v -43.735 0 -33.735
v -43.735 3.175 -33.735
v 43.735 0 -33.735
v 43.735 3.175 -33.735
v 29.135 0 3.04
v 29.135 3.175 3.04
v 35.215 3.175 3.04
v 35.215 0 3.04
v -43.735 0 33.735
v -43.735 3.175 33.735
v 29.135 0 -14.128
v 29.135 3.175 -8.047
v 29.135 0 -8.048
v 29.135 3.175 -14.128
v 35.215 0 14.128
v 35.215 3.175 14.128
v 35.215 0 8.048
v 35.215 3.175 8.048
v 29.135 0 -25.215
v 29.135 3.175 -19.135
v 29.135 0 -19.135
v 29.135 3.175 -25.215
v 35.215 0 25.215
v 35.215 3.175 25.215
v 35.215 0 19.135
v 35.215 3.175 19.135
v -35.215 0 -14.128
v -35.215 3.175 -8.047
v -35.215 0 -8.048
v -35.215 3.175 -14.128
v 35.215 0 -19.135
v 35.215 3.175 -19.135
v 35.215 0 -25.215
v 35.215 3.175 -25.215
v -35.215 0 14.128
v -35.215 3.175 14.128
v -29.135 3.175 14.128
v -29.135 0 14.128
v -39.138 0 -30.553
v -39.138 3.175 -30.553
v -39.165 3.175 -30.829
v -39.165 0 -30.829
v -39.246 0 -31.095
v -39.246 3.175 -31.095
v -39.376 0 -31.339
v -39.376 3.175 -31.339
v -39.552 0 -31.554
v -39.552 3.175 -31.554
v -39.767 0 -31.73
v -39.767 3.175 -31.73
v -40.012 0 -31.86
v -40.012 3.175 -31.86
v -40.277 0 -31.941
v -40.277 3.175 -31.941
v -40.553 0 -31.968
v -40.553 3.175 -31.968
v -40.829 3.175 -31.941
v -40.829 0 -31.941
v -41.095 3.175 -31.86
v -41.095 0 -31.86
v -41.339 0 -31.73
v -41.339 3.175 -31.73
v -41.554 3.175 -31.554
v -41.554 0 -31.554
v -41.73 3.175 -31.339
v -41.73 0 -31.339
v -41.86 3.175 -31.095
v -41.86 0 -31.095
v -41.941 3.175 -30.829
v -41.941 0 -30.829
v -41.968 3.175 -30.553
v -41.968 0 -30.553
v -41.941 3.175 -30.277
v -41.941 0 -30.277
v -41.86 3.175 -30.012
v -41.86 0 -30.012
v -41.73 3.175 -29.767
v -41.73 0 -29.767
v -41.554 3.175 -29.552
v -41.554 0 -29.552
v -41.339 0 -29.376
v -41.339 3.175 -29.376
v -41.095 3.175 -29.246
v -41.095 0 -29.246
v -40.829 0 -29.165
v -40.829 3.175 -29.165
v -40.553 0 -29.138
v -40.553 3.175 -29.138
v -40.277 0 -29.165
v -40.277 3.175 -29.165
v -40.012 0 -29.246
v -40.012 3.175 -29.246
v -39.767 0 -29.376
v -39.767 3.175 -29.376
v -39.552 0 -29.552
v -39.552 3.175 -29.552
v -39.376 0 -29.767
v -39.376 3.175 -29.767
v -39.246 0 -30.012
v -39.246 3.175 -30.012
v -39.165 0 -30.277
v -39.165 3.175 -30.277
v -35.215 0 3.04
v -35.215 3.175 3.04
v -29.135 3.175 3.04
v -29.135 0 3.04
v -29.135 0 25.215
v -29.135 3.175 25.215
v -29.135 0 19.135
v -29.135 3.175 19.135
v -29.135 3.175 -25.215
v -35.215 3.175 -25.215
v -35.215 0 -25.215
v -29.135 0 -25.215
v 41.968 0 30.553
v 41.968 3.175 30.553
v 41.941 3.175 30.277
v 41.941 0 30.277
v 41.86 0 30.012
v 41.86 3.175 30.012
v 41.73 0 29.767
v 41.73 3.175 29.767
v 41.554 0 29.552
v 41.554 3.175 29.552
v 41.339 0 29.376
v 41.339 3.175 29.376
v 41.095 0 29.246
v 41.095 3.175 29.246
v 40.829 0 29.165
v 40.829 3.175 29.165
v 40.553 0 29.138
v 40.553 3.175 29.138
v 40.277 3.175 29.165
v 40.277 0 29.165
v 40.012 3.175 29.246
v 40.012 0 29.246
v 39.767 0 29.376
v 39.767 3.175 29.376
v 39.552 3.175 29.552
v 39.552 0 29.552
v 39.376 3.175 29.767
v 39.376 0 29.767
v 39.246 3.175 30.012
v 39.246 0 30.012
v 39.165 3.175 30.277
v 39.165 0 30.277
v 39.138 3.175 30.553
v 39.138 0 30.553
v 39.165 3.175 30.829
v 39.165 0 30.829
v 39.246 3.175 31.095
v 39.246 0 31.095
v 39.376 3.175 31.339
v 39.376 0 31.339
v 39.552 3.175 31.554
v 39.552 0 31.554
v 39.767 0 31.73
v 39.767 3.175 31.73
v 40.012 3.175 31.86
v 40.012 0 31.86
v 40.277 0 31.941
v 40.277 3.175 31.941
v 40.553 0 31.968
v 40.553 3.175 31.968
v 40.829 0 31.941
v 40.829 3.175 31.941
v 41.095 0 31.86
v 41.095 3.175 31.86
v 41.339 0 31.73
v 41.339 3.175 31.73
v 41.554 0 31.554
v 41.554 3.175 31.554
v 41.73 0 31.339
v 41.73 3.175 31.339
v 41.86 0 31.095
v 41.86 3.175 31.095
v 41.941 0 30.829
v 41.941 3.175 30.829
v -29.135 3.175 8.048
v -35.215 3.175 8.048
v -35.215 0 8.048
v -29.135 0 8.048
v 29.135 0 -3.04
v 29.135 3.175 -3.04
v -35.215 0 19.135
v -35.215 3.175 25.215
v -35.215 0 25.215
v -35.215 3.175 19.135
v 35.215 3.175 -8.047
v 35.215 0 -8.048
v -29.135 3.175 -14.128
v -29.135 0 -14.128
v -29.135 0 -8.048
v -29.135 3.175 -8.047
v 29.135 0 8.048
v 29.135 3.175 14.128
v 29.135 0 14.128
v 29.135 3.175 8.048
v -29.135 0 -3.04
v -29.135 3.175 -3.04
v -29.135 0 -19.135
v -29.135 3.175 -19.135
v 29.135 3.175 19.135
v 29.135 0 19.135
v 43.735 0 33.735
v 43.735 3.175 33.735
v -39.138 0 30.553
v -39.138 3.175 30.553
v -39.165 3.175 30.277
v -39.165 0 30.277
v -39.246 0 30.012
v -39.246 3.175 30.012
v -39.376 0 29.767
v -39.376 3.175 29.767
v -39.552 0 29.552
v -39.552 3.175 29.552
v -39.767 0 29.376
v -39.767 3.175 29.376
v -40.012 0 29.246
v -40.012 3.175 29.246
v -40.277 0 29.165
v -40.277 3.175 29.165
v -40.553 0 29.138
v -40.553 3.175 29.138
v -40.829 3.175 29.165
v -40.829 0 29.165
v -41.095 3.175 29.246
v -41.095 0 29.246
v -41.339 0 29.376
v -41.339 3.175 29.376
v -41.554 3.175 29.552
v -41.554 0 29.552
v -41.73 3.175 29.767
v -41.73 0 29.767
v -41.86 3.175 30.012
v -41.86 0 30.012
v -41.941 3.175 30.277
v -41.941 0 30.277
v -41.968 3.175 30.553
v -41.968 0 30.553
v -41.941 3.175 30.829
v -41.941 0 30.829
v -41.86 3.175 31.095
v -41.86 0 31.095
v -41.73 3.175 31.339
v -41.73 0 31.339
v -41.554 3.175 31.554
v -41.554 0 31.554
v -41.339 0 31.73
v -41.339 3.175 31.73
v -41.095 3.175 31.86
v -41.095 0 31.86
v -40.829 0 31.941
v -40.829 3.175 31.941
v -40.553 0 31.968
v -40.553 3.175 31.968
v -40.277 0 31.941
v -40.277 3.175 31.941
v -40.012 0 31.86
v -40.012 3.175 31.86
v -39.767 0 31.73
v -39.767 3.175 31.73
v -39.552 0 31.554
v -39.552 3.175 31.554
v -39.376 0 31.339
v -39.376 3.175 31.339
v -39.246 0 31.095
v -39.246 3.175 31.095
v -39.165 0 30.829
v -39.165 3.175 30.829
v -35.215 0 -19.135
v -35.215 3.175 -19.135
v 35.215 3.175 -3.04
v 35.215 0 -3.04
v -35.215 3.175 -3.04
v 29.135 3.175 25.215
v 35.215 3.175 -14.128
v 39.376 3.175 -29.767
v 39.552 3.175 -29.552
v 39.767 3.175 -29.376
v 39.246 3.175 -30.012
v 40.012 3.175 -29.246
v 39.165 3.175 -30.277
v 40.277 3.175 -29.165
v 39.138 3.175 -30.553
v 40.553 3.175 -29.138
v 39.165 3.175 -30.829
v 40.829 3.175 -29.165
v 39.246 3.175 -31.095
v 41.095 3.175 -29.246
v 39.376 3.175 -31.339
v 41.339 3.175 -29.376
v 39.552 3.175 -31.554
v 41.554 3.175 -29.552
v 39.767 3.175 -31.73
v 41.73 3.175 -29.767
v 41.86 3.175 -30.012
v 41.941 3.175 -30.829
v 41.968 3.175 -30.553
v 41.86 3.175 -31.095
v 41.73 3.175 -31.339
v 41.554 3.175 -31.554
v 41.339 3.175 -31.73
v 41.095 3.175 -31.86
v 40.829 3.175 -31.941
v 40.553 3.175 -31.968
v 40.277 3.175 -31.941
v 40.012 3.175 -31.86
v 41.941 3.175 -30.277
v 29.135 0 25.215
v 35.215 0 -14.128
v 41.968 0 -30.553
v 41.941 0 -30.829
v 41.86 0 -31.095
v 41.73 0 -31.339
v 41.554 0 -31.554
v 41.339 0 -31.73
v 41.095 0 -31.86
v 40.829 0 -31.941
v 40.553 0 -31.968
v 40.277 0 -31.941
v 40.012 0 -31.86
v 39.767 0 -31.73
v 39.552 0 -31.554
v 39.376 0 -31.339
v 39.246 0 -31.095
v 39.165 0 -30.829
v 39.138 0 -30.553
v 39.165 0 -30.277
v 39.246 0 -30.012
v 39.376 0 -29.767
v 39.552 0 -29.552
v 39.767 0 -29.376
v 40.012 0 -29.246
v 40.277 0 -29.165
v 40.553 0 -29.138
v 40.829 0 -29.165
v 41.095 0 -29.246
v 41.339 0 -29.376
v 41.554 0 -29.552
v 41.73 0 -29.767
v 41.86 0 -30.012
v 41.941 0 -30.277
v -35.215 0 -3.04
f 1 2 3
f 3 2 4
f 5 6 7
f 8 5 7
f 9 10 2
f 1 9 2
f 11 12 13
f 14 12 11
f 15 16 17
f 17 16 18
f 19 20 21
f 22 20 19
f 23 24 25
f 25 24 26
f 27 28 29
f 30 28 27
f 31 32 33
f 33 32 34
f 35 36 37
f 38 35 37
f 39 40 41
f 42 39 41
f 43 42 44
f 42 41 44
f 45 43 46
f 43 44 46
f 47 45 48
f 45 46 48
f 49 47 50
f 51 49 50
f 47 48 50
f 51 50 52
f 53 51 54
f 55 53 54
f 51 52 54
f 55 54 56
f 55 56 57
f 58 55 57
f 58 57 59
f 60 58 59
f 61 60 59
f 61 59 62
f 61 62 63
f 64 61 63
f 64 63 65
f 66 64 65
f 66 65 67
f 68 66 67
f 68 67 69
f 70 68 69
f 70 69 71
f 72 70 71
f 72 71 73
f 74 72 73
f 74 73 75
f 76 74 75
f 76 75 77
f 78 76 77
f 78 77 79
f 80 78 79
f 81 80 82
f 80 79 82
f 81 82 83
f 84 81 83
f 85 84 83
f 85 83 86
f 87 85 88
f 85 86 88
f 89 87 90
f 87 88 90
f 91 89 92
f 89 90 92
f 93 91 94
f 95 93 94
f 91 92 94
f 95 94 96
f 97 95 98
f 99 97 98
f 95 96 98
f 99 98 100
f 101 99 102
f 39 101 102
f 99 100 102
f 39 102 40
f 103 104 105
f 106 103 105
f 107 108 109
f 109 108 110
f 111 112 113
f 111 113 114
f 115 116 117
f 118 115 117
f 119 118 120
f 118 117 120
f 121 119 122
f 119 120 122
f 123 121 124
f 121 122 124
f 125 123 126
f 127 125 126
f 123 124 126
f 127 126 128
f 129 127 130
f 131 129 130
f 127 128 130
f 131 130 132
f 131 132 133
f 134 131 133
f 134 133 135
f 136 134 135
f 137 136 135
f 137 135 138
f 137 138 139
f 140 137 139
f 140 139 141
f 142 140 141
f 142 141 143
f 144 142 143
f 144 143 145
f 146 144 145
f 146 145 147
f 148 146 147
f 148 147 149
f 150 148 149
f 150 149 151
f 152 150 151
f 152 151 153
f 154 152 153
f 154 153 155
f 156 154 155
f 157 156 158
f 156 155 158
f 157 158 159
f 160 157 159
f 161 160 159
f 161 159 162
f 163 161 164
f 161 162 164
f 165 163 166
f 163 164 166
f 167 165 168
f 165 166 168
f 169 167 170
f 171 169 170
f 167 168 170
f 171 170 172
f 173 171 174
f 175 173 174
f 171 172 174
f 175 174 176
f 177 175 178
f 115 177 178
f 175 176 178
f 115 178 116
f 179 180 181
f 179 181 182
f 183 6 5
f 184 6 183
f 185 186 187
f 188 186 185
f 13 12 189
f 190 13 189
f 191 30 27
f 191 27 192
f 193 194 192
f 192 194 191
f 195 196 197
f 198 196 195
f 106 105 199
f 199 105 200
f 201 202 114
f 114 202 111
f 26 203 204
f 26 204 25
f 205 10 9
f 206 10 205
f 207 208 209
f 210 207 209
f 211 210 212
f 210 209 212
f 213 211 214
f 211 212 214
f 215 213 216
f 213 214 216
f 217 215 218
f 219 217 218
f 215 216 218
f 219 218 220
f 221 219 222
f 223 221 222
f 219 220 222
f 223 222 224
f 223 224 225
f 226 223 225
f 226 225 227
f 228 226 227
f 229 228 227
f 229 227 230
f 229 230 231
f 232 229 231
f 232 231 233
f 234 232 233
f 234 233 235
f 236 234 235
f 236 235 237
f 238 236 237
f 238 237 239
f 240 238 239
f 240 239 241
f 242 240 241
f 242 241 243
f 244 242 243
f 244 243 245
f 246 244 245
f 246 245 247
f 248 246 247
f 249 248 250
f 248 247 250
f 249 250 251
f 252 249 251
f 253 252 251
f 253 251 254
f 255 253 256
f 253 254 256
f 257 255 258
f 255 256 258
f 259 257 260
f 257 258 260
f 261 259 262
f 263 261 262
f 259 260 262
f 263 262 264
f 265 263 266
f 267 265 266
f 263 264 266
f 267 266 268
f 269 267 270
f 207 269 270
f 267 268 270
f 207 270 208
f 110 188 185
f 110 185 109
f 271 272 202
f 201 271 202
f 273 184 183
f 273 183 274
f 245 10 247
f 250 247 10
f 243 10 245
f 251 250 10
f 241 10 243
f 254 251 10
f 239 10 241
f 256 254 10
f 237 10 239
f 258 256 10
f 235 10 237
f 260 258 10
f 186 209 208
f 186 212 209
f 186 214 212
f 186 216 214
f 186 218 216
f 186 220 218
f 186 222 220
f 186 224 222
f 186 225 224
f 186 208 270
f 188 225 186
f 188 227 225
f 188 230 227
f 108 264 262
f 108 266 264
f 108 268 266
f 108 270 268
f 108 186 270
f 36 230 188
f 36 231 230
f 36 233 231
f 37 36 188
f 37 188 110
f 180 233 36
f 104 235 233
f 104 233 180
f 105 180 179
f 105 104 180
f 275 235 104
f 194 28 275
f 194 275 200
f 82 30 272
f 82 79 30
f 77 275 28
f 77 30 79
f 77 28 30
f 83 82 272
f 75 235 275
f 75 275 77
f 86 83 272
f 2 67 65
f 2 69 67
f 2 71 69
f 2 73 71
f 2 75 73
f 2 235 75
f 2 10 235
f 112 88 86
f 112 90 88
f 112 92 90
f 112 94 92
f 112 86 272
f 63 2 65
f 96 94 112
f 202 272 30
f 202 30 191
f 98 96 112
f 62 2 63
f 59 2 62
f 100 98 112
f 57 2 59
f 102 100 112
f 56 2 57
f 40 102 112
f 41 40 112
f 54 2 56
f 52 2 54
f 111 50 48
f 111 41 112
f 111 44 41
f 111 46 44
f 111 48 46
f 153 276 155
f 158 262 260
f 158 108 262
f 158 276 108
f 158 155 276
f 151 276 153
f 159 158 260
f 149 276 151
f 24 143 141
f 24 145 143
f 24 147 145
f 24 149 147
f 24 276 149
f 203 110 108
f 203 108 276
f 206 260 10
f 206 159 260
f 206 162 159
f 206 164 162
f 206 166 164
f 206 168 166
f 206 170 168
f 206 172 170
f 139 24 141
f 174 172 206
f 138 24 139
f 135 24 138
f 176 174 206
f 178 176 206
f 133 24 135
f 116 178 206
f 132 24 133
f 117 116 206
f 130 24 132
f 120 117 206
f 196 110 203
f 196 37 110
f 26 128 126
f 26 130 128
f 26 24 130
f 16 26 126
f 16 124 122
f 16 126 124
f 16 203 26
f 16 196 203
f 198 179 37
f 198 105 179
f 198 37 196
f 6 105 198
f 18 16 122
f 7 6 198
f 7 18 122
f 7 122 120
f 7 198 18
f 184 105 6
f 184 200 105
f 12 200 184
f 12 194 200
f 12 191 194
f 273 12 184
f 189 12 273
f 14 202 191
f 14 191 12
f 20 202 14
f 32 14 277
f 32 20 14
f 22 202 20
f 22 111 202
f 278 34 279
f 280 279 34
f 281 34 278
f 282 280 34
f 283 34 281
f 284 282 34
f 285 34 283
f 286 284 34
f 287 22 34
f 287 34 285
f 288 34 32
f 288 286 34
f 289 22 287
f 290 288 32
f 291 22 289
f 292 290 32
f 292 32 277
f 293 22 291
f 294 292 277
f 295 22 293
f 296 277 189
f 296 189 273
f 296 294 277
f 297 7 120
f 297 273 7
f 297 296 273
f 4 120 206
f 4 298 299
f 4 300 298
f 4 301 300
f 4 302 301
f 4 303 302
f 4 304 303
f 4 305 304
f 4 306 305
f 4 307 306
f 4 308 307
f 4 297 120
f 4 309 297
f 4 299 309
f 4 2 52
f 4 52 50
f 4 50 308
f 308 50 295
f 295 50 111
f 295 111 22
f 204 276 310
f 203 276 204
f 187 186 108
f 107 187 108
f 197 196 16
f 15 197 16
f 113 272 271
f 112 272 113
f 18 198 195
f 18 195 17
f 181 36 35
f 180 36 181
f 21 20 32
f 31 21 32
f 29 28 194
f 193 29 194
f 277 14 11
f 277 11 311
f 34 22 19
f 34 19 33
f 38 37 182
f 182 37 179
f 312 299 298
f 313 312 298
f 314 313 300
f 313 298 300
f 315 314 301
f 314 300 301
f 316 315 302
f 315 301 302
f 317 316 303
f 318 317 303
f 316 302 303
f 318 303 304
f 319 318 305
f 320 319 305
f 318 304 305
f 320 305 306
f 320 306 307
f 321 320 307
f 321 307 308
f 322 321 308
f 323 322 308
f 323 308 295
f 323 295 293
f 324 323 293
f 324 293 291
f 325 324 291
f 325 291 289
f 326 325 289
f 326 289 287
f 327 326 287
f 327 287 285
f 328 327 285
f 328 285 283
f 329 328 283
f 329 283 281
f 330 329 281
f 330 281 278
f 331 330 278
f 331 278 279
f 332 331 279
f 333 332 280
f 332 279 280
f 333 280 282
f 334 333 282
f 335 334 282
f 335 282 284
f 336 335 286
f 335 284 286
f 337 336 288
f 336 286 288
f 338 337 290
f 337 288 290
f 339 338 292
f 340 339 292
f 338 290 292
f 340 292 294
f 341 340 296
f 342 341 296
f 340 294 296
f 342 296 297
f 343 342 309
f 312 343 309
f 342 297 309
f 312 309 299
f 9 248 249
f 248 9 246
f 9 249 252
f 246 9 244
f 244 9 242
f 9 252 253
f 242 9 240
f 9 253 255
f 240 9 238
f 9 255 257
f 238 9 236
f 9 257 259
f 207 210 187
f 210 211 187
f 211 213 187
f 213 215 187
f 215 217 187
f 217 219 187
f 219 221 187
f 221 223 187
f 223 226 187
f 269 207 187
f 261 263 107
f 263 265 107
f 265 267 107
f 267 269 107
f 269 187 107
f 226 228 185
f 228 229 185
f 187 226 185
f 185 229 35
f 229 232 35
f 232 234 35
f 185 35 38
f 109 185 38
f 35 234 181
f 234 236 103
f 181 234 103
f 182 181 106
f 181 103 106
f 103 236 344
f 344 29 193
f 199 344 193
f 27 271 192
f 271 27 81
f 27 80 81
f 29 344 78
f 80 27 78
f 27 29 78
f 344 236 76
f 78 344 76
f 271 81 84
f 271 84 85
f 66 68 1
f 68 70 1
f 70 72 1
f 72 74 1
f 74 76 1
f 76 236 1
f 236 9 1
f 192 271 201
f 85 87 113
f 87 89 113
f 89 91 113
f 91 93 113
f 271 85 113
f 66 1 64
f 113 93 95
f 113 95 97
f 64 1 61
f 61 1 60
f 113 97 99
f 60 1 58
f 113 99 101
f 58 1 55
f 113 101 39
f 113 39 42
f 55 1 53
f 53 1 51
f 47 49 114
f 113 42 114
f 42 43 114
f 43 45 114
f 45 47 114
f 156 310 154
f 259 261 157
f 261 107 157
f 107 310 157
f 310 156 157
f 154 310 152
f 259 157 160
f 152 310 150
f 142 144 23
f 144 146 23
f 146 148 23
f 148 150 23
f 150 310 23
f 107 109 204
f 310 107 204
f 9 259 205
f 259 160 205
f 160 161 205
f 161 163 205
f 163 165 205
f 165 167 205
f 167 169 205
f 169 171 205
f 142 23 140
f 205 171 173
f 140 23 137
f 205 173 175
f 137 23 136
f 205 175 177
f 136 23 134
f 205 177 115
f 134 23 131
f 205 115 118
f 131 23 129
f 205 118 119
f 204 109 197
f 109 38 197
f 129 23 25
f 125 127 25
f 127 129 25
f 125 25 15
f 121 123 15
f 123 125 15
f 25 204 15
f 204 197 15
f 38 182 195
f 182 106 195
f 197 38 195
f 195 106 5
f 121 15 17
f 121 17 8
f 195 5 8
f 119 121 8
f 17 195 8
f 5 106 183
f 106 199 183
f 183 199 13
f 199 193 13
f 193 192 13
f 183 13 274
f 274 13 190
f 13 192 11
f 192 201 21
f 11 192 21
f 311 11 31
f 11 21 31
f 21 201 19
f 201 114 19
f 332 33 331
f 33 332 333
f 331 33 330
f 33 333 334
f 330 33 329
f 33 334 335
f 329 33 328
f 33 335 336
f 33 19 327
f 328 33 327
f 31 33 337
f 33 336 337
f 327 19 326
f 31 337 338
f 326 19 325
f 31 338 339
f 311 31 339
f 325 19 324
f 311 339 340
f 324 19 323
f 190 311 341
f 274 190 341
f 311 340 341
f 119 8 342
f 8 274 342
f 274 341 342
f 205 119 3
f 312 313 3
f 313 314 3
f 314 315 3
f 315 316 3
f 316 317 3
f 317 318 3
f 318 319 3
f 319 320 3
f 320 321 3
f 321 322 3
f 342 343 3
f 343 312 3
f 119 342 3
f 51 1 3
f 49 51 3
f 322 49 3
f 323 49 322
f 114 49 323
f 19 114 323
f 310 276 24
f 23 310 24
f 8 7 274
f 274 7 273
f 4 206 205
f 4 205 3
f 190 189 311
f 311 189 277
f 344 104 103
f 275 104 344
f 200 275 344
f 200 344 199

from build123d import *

# Parameters (mm, degrees)
SKETCH1_W           = 100.17
SKETCH1_H           = 80.17
BOSS_EXTRUDE1_DEPTH = 3.175
SKETCH2_W           = 6.08
SKETCH2_H           = 6.08
CUT_EXTRUDE2_DEPTH  = 4.175
LPATTERN1_COUNT     = 5
LPATTERN1_PITCH     = 11.0875
SKETCH5_W           = 107.47
SKETCH5_H           = 87.47
SKETCH5_W_2         = 87.47
SKETCH5_H_2         = 67.47
CUT_EXTRUDE4_DEPTH  = 10
SKETCH6_R           = 1.415
CUT_EXTRUDE5_DEPTH  = 10


with BuildPart() as part:
    # Sketch1 → Boss-Extrude1 (new body)
    with BuildSketch(Plane(origin=(0, 0, 0), x_dir=(1, 0, 0), z_dir=(0, 1, 0))):
        Rectangle(SKETCH1_W, SKETCH1_H)
    extrude(amount=BOSS_EXTRUDE1_DEPTH)

    # Sketch2 → Cut-Extrude2 (cut, through all)
    with BuildSketch(Plane(origin=(0, 3.175, 0), x_dir=(1, 0, 0), z_dir=(0, 1, 0))):
        with Locations((-32.175, 22.175)):
            Rectangle(SKETCH2_W, SKETCH2_H)
        with Locations((32.175, 22.175)):
            Rectangle(SKETCH2_W, SKETCH2_H)
    cut_extrude2 = extrude(amount=-CUT_EXTRUDE2_DEPTH, mode=Mode.SUBTRACT)

    # LPattern1: Cut-Extrude2 ×5
    with Locations(*[(0, 0, i * LPATTERN1_PITCH) for i in range(1, LPATTERN1_COUNT)]):
        add(cut_extrude2, mode=Mode.SUBTRACT)

    # Sketch5 → Cut-Extrude4 (cut)
    with BuildSketch(Plane(origin=(0, 3.175, 0), x_dir=(1, 0, 0), z_dir=(0, 1, 0))):
        Rectangle(SKETCH5_W, SKETCH5_H)
        Rectangle(SKETCH5_W_2, SKETCH5_H_2, mode=Mode.SUBTRACT)
    extrude(amount=-CUT_EXTRUDE4_DEPTH, mode=Mode.SUBTRACT)

    # Sketch6 → Cut-Extrude5 (cut)
    with BuildSketch(Plane(origin=(0, 3.175, 0), x_dir=(1, 0, 0), z_dir=(0, 1, 0))):
        with Locations((-40.553019485, 30.553019485)):
            Circle(SKETCH6_R)
        with Locations((-40.553019485, -30.553019485)):
            Circle(SKETCH6_R)
        with Locations((40.553019485, -30.553019485)):
            Circle(SKETCH6_R)
        with Locations((40.553019485, 30.553019485)):
            Circle(SKETCH6_R)
    extrude(amount=-CUT_EXTRUDE5_DEPTH, mode=Mode.SUBTRACT)


solid = part.part
